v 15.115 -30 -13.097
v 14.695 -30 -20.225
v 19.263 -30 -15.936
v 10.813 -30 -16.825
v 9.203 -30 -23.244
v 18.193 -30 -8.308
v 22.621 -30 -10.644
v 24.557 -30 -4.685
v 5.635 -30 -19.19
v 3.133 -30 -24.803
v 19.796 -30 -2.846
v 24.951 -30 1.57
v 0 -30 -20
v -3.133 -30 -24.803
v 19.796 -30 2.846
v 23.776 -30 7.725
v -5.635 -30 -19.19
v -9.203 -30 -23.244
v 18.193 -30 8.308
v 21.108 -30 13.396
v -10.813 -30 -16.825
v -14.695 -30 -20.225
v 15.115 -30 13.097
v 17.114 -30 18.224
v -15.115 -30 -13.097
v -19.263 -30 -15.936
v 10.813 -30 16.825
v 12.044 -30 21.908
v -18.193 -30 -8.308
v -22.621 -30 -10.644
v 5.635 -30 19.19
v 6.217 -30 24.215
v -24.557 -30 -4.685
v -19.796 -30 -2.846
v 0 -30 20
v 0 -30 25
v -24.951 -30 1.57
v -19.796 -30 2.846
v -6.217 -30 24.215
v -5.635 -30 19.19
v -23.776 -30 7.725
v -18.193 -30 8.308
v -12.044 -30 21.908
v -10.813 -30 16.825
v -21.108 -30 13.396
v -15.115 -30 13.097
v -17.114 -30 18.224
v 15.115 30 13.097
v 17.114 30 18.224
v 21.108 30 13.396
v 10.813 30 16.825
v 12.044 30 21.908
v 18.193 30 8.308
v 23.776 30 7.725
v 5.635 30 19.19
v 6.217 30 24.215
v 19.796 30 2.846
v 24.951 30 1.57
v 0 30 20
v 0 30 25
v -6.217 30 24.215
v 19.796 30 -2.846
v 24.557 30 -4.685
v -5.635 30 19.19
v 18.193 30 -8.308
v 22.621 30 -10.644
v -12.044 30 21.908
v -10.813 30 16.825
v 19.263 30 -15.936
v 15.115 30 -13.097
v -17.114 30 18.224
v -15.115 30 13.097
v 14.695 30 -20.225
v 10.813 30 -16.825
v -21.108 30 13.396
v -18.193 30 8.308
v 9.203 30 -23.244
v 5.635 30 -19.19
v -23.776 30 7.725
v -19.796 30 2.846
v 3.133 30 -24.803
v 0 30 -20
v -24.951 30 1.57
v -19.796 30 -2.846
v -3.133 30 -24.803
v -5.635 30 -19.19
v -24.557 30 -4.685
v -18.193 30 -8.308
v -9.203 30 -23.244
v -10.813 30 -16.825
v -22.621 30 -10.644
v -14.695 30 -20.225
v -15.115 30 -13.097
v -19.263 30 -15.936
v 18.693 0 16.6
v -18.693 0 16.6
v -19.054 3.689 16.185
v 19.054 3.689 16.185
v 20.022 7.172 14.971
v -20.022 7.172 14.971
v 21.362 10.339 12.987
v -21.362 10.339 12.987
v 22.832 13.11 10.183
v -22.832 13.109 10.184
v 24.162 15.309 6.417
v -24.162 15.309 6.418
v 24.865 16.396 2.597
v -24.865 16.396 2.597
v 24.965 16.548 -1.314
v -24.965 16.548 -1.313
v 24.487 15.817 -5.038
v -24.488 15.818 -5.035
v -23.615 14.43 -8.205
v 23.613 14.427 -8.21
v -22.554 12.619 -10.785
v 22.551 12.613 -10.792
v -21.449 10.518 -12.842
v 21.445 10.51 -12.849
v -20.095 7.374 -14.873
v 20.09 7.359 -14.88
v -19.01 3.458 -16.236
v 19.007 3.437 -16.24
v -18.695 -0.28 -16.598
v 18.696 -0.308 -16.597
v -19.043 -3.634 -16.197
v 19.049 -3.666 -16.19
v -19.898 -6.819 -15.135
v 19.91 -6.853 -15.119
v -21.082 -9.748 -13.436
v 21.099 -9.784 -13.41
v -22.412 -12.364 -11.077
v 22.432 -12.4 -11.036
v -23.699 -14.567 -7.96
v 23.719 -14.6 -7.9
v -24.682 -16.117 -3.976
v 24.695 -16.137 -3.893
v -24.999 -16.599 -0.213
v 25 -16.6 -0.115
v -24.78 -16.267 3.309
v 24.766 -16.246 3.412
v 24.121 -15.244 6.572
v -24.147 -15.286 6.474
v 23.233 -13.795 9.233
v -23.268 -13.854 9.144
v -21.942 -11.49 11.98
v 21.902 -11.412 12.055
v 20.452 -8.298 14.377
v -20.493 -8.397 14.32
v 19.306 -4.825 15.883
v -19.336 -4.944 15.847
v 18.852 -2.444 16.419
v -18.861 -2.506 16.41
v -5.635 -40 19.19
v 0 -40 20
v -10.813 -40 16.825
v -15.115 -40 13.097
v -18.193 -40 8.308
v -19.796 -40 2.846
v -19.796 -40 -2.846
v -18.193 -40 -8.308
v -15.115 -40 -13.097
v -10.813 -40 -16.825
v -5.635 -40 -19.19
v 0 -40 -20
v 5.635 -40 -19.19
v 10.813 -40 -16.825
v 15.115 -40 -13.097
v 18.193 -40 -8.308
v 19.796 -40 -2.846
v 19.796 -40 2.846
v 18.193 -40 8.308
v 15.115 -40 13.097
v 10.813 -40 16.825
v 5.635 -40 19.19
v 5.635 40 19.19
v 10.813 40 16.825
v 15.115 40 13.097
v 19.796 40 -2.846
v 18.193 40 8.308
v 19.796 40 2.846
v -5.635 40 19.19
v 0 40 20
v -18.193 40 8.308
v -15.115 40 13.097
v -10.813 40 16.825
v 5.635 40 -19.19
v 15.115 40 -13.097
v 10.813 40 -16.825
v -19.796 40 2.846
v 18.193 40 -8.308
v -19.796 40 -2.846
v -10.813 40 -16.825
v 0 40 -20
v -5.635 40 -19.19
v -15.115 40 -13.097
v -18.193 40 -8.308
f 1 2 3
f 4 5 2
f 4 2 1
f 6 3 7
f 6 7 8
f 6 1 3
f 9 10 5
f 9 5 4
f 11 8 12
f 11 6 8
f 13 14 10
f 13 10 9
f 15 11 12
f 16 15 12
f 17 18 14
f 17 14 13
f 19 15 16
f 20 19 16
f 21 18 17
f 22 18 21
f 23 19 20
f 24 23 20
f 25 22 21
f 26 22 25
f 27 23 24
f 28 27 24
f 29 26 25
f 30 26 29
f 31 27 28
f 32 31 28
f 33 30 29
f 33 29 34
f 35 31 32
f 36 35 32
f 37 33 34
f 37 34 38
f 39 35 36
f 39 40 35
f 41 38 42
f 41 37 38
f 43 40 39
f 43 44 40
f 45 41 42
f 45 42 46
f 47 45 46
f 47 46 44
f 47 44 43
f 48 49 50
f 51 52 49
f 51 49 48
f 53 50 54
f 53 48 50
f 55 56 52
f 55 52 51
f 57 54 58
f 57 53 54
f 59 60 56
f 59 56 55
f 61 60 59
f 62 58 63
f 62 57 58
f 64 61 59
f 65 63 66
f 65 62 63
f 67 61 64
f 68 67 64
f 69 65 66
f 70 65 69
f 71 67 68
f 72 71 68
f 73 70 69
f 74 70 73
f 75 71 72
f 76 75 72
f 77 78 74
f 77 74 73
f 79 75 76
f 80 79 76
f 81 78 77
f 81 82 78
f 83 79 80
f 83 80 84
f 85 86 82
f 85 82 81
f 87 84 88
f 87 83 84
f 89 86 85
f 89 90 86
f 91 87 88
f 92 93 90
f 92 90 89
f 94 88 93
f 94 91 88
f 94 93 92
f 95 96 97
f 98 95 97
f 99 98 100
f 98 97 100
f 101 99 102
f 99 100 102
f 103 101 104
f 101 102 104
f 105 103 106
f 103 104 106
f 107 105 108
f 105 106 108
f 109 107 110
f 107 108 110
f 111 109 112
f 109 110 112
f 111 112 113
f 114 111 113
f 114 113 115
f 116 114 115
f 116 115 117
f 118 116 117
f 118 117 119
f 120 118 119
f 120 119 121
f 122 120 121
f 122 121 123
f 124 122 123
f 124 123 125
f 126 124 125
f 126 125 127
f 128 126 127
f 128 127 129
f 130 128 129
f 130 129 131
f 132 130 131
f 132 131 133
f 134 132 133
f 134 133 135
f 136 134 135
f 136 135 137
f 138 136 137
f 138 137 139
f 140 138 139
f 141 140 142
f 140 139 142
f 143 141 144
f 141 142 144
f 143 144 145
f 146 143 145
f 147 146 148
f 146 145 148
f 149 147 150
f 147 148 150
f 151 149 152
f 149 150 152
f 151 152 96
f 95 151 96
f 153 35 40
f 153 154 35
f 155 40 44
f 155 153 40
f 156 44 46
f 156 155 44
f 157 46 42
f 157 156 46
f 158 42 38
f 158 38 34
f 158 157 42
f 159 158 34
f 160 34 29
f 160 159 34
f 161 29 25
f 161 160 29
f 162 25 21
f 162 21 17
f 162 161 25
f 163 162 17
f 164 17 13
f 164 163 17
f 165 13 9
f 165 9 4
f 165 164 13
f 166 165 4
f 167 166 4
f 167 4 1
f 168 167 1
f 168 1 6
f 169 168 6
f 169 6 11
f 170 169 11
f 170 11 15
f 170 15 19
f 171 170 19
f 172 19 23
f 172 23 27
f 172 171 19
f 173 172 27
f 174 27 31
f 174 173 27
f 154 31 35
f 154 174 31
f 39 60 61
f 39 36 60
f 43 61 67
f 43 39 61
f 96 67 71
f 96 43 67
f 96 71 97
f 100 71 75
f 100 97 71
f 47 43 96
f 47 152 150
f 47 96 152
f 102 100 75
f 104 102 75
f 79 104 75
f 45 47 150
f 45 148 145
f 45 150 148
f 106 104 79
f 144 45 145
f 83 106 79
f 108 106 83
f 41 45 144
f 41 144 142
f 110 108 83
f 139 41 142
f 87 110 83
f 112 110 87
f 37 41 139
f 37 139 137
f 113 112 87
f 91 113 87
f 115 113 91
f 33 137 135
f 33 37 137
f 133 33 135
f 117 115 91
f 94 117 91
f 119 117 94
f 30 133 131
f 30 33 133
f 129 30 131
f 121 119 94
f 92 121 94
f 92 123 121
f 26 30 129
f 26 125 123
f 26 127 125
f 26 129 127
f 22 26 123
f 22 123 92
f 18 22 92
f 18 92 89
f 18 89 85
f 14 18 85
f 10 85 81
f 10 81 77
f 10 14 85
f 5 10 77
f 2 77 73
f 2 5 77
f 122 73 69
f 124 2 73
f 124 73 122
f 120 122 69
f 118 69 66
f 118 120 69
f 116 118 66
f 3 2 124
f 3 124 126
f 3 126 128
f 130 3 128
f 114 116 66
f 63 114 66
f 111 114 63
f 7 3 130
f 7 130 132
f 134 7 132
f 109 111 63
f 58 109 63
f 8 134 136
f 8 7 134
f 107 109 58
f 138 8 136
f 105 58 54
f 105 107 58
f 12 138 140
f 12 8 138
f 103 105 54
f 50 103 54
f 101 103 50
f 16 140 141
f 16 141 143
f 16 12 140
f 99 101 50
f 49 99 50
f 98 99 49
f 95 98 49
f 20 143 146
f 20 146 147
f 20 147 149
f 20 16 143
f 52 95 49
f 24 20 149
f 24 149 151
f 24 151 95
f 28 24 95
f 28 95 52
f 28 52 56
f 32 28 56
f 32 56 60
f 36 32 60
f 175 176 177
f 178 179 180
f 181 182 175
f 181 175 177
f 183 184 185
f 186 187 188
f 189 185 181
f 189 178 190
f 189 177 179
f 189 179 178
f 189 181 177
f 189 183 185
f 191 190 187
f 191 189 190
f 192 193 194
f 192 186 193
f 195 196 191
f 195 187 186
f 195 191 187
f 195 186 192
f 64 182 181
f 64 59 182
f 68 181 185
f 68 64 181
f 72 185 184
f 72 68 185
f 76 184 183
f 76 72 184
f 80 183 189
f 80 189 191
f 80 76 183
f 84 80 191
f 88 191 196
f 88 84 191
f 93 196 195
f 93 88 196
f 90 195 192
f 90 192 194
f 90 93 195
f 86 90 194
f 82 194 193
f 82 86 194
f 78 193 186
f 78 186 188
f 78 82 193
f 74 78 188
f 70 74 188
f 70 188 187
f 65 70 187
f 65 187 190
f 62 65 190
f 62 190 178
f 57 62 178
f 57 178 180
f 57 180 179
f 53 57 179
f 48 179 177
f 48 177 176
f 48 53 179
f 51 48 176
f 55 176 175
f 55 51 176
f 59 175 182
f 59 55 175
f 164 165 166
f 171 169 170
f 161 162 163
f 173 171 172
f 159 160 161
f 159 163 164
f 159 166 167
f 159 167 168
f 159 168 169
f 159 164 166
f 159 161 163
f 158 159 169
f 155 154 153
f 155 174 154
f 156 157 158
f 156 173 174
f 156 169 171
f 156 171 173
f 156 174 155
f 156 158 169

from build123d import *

# Parameters (mm, degrees)
SKETCH3_W              = 16.6
SKETCH3_H              = 25
F_25_0MM_DOWEL_HOLE2_D = 33.2


with BuildPart() as part:
    # Sketch1 → Revolve1 (revolve)
    with BuildSketch(Plane.XY, mode=Mode.PRIVATE) as revolve1_sk:
        Polygon((20, -30), (20, -40), (0, -40), (0, 40), (20, 40), (20, 30), (25, 30), (25, -30), align=None)
    revolve(revolve1_sk.sketch.rotate(Axis((0, 40, 0), (0, -1, 0)), 90), axis=Axis((0, 40, 0), (0, -1, 0)))

    # Sketch3 → Ø1.0mm Dowel Hole1 (revolve, cut)
    with BuildSketch(Plane.ZX):
        with Locations((8.3, 12.5)):
            Rectangle(SKETCH3_W, SKETCH3_H)
    revolve(axis=Axis((-6.35, 0, 0), (1, 0, 0)), mode=Mode.SUBTRACT)

    # Ø25.0mm Dowel Hole2 (through all)
    with Locations(Plane(origin=(0, 0, 0), x_dir=(0, 0, -1), z_dir=(1, 0, 0))):
        with Locations((0, 0)):
            Hole(F_25_0MM_DOWEL_HOLE2_D / 2)


solid = part.part
